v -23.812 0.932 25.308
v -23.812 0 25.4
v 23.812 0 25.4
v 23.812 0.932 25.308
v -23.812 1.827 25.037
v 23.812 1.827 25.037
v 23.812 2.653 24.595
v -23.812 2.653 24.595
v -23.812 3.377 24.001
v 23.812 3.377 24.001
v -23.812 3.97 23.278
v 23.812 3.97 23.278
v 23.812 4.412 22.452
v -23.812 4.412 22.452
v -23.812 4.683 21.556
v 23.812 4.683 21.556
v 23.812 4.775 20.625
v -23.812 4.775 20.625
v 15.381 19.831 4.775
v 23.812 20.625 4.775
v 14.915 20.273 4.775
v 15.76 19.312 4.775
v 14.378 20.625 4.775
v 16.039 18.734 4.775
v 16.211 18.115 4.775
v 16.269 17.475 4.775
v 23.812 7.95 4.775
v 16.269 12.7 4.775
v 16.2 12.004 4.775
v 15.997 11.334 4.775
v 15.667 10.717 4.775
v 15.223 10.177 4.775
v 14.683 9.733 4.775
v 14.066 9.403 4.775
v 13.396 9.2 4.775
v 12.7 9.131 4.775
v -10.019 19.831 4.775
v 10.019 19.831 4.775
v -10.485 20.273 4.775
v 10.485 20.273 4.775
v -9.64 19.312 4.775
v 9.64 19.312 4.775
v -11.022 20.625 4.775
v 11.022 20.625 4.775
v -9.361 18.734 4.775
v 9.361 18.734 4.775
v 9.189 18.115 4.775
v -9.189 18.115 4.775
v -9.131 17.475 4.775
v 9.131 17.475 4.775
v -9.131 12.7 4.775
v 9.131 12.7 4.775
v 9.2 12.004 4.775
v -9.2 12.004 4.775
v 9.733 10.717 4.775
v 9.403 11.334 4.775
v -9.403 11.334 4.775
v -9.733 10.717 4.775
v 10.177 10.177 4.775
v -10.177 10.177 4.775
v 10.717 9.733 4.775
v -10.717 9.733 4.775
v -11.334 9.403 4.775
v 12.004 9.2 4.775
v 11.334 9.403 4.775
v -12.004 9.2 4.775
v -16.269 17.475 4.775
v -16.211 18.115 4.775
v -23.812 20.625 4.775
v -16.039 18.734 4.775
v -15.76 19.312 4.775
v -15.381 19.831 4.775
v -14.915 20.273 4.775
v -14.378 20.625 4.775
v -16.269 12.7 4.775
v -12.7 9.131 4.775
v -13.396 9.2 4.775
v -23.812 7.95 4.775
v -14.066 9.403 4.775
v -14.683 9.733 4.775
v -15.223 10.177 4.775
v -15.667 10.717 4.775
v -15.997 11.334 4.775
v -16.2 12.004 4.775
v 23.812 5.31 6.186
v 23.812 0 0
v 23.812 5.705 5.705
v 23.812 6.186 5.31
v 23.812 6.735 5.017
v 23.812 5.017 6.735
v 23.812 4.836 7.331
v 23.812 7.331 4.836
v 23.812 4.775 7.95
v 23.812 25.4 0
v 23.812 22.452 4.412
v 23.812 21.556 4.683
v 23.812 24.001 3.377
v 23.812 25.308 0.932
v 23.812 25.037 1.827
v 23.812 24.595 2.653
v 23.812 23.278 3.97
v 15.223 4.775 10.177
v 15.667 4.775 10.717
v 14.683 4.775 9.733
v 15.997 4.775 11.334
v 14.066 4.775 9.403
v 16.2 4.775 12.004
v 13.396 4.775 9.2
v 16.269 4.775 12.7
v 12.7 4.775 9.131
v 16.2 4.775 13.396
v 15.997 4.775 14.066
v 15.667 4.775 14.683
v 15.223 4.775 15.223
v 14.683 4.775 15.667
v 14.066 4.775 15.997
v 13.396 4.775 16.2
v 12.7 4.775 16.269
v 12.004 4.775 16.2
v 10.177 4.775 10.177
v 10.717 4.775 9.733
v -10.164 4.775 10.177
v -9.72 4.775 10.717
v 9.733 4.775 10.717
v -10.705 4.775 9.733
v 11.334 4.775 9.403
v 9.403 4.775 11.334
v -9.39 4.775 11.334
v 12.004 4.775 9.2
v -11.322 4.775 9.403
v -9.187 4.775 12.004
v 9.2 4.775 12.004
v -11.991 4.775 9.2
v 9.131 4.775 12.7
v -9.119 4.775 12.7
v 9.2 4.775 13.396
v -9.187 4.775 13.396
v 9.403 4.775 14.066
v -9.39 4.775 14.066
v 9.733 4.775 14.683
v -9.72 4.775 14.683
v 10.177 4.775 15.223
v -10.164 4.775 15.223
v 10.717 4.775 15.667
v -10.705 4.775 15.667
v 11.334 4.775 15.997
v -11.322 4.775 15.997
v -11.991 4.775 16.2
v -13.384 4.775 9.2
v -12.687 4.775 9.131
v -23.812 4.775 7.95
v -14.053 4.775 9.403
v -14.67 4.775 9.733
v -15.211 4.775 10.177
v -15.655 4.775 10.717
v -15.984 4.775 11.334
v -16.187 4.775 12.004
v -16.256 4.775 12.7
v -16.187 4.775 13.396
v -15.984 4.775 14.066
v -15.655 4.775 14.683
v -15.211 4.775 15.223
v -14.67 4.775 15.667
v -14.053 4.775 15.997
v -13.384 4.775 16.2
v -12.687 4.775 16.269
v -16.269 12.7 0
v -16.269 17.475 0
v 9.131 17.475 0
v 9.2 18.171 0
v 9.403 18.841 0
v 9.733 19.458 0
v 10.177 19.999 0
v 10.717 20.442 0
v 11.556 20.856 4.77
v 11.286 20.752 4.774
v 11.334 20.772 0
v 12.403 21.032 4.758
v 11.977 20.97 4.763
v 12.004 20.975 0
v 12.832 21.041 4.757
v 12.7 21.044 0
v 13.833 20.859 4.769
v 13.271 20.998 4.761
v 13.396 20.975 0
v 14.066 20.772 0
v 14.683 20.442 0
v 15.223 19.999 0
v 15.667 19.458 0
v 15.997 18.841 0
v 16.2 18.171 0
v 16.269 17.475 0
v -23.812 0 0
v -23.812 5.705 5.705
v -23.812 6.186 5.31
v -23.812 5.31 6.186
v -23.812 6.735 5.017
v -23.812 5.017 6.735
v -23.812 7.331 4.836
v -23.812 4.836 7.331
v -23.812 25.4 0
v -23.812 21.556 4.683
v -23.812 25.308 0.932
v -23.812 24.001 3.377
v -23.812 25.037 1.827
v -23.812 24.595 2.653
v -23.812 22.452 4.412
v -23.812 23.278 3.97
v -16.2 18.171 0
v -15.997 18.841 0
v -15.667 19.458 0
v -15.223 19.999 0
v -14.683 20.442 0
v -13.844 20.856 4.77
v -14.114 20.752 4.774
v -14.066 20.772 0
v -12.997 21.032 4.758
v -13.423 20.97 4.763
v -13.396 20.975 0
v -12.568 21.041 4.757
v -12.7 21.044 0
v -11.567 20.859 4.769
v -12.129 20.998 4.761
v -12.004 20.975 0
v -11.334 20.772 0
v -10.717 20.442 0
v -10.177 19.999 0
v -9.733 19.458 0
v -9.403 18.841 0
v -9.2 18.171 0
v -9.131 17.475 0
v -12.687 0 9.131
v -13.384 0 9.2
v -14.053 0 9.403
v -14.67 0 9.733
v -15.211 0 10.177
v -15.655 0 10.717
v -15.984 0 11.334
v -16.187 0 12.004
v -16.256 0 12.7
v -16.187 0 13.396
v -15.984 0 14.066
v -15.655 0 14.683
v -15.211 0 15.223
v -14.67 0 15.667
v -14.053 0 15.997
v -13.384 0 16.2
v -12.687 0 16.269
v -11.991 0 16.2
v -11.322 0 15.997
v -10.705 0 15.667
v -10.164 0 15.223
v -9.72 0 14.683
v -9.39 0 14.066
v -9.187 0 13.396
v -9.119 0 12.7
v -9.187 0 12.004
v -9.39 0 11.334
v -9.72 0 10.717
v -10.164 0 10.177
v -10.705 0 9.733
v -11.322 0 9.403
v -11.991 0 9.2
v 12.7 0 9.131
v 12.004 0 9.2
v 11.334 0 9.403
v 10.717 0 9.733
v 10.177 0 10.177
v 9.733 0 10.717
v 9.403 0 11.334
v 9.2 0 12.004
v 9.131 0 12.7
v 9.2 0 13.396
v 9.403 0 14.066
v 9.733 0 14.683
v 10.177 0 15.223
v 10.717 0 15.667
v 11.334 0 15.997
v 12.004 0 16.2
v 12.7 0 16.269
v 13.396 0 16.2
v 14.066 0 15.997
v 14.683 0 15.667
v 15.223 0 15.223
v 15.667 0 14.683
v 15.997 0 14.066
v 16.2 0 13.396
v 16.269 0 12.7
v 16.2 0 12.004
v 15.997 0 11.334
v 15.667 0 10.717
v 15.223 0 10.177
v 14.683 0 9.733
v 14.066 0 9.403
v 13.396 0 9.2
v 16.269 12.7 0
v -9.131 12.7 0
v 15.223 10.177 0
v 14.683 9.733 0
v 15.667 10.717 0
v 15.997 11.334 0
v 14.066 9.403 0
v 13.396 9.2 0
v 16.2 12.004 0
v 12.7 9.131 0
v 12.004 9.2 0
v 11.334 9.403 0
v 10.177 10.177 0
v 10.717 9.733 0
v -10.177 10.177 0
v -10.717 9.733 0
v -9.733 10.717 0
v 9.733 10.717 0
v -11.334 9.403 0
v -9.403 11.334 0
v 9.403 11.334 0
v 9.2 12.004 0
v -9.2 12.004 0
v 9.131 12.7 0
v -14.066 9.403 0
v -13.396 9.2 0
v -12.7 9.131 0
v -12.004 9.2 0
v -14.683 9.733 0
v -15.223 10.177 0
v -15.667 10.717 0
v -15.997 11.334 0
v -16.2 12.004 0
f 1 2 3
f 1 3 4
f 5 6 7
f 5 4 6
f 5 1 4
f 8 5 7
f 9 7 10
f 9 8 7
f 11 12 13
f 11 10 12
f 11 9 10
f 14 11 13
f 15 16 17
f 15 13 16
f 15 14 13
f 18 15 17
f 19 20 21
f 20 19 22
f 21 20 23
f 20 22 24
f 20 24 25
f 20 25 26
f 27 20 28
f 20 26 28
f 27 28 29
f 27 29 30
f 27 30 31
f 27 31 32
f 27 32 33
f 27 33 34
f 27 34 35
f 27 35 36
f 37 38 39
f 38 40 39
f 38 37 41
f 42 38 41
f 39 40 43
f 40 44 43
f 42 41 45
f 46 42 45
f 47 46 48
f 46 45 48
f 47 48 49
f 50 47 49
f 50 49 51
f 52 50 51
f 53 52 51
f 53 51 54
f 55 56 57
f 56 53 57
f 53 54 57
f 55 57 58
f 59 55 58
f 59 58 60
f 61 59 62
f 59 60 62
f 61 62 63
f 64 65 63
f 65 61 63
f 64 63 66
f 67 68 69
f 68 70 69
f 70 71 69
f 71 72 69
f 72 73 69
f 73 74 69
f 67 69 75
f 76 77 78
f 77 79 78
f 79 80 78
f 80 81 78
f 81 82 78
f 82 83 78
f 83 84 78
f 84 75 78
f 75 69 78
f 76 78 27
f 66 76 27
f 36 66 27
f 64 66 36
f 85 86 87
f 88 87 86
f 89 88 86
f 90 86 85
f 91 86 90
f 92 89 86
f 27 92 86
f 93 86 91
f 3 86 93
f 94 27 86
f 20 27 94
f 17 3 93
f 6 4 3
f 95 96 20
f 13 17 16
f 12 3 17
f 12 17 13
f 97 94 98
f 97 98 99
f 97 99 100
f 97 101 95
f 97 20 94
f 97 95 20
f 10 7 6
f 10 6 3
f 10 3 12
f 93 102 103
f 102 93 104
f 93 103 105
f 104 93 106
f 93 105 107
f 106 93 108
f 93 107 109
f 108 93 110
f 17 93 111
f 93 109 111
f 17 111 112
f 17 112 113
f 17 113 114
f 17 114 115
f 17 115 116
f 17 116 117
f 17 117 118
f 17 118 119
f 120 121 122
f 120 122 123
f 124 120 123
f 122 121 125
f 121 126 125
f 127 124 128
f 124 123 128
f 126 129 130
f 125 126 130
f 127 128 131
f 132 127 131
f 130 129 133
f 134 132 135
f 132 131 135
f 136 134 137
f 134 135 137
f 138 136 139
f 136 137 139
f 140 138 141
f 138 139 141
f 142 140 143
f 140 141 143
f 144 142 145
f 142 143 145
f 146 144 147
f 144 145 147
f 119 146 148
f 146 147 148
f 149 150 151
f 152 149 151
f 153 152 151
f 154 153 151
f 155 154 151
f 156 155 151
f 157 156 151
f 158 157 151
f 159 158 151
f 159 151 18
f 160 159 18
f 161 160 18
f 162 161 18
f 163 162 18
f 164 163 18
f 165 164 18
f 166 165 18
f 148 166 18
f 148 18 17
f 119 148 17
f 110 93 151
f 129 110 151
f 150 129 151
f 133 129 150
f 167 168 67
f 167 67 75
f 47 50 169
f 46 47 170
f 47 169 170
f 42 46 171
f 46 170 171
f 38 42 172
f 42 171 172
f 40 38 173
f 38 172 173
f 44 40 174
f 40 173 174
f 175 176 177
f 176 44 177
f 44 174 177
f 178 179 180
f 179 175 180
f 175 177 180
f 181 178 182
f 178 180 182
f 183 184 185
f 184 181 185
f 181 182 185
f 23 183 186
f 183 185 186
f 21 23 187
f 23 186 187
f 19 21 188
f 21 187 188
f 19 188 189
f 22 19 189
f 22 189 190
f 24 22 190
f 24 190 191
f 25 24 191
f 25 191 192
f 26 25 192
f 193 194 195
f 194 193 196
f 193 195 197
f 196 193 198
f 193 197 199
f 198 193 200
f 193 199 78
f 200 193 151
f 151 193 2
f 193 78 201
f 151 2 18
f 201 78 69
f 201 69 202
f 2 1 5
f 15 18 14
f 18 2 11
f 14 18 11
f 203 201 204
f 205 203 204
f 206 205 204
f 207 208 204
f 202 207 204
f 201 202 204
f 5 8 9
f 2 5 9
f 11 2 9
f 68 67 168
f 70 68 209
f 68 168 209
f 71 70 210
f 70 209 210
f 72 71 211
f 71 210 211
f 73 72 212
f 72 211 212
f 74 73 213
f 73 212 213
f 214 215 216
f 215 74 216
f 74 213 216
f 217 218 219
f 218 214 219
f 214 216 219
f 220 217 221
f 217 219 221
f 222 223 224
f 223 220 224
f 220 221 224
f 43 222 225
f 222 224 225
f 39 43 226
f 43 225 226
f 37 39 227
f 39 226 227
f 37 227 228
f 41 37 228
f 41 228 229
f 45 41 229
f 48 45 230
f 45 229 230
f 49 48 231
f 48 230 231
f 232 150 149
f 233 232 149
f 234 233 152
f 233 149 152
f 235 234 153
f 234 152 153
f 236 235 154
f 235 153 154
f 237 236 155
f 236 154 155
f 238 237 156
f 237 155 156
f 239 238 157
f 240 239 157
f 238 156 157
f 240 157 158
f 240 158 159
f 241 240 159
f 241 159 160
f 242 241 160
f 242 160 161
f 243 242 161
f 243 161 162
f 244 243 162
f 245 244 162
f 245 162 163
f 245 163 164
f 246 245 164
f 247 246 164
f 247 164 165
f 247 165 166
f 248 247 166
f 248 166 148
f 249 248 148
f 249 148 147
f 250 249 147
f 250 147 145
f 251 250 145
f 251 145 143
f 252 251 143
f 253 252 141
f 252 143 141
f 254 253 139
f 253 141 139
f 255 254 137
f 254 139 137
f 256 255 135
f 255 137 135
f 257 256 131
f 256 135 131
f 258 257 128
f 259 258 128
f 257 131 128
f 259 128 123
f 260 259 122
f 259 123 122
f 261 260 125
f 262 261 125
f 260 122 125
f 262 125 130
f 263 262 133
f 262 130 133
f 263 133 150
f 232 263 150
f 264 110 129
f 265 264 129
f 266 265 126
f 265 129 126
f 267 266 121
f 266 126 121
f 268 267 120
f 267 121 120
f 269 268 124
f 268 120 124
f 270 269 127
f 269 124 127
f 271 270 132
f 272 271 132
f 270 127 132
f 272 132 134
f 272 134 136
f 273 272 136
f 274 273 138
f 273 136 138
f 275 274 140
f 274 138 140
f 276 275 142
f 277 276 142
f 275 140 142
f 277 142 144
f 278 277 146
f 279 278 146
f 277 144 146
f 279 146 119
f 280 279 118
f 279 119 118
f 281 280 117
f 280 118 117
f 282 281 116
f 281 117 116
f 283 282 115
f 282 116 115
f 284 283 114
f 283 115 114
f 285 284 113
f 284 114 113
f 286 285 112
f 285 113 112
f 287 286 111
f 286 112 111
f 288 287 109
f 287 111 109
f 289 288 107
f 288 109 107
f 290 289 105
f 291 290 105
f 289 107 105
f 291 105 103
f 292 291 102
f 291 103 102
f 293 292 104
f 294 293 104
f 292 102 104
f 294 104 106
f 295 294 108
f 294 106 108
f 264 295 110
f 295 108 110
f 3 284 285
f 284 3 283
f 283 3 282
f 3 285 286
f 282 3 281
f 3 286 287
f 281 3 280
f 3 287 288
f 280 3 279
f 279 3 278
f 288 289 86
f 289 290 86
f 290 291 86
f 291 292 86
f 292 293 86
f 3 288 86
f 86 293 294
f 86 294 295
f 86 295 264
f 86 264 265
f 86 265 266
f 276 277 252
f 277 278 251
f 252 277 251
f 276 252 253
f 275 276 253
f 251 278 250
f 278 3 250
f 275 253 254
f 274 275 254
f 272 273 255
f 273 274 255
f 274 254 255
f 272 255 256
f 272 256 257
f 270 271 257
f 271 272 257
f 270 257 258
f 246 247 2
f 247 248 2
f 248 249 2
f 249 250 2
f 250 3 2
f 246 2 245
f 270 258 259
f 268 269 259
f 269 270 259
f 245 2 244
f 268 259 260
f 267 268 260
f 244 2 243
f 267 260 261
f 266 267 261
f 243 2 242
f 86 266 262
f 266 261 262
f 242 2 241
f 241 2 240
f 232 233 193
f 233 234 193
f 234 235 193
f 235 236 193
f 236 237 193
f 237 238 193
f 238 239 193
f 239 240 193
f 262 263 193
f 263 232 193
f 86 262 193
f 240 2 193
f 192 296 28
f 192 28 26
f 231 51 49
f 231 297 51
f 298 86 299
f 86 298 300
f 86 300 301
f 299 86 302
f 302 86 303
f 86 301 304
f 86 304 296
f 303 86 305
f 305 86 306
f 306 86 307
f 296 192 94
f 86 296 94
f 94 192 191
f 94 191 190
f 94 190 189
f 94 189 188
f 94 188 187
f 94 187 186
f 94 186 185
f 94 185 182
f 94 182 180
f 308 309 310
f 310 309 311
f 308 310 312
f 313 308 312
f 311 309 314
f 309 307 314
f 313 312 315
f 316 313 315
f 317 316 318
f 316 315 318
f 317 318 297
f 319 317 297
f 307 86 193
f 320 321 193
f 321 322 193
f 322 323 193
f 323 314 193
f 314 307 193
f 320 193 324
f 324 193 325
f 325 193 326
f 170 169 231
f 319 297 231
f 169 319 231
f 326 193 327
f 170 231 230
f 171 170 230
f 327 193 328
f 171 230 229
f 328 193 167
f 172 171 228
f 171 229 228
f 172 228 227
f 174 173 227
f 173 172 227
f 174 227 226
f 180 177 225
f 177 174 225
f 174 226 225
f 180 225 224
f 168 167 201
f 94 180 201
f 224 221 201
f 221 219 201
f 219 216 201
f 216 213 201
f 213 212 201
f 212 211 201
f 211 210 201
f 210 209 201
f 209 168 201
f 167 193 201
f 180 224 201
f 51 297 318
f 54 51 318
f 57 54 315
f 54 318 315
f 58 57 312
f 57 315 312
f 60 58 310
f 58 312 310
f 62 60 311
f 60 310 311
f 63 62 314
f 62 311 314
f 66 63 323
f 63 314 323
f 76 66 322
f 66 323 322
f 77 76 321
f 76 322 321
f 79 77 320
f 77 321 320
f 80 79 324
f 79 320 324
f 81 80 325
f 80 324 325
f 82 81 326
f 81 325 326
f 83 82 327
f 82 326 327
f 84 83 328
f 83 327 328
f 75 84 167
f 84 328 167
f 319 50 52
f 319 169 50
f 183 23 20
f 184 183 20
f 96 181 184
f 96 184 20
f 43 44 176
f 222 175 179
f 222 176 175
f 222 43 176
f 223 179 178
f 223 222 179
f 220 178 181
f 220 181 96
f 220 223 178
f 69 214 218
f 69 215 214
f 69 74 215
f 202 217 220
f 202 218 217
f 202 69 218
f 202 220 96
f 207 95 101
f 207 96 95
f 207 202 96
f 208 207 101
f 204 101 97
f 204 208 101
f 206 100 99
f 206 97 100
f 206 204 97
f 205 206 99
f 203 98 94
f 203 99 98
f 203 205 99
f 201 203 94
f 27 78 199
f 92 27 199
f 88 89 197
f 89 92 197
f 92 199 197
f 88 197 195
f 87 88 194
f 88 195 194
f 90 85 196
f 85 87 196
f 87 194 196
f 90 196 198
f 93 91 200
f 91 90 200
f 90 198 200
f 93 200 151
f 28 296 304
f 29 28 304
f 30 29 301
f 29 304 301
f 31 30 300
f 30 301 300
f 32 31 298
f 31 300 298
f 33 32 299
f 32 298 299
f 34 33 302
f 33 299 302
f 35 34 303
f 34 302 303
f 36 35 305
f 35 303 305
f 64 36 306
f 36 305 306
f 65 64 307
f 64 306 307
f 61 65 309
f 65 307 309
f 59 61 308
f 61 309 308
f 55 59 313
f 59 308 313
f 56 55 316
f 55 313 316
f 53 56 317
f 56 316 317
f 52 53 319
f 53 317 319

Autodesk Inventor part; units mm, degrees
ref_plane "YZ Plane" through (0, 0, 0) normal (1, 0, 0) x (0, 1, 0)
ref_plane "XZ Plane" through (0, 0, 0) normal (0, 1, 0) x (-1, 0, 0)
ref_plane "XY Plane" through (0, 0, 0) normal (0, 0, 1) x (1, 0, 0)
sketch "Sketch_1" plane through (0, 0, 0) normal (1, 0, 0) x (0, 1, 0)
  line L0 (0, 25.4) -> (0, 0)
  line L1 (0, 0) -> (25.4, 0)
  arc A0 (25.4, 0) -> (20.6248, 4.7752) centre (20.6248, 0) ccw
  line L2 (20.6248, 4.7752) -> (7.9502, 4.7752)
  arc A1 (4.7752, 7.9502) -> (7.9502, 4.7752) centre (7.9502, 7.9502) ccw
  line L3 (4.7752, 7.9502) -> (4.7752, 20.6248)
  arc A2 (4.7752, 20.6248) -> (0, 25.4) centre (0, 20.6248) ccw
extrude "Extrusion1" add sketch "Sketch_1" along normal mid plane 47.625
sketch "Sketch2" plane through (-23.8125, 0, 0) normal (0, -1, 0) x (1, 0, 0)
  point P0 (36.5125, 12.7)
hole "Hole1" at (12.7, 0, 12.7) direction (0, 1, 0) diameter 7.1374 depth 10.4648
sketch "Sketch3" plane through (-23.8125, 0, 0) normal (0, -1, 0) x (1, 0, 0)
  point P0 (11.1252, 12.7)
hole "Hole2" at (-12.6873, 0, 12.7) direction (0, 1, 0) diameter 7.1374 depth 10.4648
sketch "Sketch_2" plane through (0, 0, 0) normal (0, 0, 1) x (1, 0, 0)
  arc A0 (9.1313, 12.7) -> (16.2687, 12.7) centre (12.7, 12.7) ccw
  line L0 (16.2687, 12.7) -> (16.2687, 17.4752)
  arc A1 (16.2687, 17.4752) -> (9.1313, 17.4752) centre (12.7, 17.4752) ccw
  line L1 (9.1313, 17.4752) -> (9.1313, 12.7)
extrude "Extrusion2" cut sketch "Sketch_2" along normal blind 7.1628
sketch "Sketch_3" plane through (0, 0, 0) normal (0, 0, 1) x (1, 0, 0)
  arc A0 (-16.2687, 12.7) -> (-9.1313, 12.7) centre (-12.7, 12.7) ccw
  line L0 (-9.1313, 12.7) -> (-9.1313, 17.4752)
  arc A1 (-9.1313, 17.4752) -> (-16.2687, 17.4752) centre (-12.7, 17.4752) ccw
  line L1 (-16.2687, 17.4752) -> (-16.2687, 12.7)
extrude "Extrusion3" cut sketch "Sketch_3" along normal blind 7.1628
properties part number "4260"
